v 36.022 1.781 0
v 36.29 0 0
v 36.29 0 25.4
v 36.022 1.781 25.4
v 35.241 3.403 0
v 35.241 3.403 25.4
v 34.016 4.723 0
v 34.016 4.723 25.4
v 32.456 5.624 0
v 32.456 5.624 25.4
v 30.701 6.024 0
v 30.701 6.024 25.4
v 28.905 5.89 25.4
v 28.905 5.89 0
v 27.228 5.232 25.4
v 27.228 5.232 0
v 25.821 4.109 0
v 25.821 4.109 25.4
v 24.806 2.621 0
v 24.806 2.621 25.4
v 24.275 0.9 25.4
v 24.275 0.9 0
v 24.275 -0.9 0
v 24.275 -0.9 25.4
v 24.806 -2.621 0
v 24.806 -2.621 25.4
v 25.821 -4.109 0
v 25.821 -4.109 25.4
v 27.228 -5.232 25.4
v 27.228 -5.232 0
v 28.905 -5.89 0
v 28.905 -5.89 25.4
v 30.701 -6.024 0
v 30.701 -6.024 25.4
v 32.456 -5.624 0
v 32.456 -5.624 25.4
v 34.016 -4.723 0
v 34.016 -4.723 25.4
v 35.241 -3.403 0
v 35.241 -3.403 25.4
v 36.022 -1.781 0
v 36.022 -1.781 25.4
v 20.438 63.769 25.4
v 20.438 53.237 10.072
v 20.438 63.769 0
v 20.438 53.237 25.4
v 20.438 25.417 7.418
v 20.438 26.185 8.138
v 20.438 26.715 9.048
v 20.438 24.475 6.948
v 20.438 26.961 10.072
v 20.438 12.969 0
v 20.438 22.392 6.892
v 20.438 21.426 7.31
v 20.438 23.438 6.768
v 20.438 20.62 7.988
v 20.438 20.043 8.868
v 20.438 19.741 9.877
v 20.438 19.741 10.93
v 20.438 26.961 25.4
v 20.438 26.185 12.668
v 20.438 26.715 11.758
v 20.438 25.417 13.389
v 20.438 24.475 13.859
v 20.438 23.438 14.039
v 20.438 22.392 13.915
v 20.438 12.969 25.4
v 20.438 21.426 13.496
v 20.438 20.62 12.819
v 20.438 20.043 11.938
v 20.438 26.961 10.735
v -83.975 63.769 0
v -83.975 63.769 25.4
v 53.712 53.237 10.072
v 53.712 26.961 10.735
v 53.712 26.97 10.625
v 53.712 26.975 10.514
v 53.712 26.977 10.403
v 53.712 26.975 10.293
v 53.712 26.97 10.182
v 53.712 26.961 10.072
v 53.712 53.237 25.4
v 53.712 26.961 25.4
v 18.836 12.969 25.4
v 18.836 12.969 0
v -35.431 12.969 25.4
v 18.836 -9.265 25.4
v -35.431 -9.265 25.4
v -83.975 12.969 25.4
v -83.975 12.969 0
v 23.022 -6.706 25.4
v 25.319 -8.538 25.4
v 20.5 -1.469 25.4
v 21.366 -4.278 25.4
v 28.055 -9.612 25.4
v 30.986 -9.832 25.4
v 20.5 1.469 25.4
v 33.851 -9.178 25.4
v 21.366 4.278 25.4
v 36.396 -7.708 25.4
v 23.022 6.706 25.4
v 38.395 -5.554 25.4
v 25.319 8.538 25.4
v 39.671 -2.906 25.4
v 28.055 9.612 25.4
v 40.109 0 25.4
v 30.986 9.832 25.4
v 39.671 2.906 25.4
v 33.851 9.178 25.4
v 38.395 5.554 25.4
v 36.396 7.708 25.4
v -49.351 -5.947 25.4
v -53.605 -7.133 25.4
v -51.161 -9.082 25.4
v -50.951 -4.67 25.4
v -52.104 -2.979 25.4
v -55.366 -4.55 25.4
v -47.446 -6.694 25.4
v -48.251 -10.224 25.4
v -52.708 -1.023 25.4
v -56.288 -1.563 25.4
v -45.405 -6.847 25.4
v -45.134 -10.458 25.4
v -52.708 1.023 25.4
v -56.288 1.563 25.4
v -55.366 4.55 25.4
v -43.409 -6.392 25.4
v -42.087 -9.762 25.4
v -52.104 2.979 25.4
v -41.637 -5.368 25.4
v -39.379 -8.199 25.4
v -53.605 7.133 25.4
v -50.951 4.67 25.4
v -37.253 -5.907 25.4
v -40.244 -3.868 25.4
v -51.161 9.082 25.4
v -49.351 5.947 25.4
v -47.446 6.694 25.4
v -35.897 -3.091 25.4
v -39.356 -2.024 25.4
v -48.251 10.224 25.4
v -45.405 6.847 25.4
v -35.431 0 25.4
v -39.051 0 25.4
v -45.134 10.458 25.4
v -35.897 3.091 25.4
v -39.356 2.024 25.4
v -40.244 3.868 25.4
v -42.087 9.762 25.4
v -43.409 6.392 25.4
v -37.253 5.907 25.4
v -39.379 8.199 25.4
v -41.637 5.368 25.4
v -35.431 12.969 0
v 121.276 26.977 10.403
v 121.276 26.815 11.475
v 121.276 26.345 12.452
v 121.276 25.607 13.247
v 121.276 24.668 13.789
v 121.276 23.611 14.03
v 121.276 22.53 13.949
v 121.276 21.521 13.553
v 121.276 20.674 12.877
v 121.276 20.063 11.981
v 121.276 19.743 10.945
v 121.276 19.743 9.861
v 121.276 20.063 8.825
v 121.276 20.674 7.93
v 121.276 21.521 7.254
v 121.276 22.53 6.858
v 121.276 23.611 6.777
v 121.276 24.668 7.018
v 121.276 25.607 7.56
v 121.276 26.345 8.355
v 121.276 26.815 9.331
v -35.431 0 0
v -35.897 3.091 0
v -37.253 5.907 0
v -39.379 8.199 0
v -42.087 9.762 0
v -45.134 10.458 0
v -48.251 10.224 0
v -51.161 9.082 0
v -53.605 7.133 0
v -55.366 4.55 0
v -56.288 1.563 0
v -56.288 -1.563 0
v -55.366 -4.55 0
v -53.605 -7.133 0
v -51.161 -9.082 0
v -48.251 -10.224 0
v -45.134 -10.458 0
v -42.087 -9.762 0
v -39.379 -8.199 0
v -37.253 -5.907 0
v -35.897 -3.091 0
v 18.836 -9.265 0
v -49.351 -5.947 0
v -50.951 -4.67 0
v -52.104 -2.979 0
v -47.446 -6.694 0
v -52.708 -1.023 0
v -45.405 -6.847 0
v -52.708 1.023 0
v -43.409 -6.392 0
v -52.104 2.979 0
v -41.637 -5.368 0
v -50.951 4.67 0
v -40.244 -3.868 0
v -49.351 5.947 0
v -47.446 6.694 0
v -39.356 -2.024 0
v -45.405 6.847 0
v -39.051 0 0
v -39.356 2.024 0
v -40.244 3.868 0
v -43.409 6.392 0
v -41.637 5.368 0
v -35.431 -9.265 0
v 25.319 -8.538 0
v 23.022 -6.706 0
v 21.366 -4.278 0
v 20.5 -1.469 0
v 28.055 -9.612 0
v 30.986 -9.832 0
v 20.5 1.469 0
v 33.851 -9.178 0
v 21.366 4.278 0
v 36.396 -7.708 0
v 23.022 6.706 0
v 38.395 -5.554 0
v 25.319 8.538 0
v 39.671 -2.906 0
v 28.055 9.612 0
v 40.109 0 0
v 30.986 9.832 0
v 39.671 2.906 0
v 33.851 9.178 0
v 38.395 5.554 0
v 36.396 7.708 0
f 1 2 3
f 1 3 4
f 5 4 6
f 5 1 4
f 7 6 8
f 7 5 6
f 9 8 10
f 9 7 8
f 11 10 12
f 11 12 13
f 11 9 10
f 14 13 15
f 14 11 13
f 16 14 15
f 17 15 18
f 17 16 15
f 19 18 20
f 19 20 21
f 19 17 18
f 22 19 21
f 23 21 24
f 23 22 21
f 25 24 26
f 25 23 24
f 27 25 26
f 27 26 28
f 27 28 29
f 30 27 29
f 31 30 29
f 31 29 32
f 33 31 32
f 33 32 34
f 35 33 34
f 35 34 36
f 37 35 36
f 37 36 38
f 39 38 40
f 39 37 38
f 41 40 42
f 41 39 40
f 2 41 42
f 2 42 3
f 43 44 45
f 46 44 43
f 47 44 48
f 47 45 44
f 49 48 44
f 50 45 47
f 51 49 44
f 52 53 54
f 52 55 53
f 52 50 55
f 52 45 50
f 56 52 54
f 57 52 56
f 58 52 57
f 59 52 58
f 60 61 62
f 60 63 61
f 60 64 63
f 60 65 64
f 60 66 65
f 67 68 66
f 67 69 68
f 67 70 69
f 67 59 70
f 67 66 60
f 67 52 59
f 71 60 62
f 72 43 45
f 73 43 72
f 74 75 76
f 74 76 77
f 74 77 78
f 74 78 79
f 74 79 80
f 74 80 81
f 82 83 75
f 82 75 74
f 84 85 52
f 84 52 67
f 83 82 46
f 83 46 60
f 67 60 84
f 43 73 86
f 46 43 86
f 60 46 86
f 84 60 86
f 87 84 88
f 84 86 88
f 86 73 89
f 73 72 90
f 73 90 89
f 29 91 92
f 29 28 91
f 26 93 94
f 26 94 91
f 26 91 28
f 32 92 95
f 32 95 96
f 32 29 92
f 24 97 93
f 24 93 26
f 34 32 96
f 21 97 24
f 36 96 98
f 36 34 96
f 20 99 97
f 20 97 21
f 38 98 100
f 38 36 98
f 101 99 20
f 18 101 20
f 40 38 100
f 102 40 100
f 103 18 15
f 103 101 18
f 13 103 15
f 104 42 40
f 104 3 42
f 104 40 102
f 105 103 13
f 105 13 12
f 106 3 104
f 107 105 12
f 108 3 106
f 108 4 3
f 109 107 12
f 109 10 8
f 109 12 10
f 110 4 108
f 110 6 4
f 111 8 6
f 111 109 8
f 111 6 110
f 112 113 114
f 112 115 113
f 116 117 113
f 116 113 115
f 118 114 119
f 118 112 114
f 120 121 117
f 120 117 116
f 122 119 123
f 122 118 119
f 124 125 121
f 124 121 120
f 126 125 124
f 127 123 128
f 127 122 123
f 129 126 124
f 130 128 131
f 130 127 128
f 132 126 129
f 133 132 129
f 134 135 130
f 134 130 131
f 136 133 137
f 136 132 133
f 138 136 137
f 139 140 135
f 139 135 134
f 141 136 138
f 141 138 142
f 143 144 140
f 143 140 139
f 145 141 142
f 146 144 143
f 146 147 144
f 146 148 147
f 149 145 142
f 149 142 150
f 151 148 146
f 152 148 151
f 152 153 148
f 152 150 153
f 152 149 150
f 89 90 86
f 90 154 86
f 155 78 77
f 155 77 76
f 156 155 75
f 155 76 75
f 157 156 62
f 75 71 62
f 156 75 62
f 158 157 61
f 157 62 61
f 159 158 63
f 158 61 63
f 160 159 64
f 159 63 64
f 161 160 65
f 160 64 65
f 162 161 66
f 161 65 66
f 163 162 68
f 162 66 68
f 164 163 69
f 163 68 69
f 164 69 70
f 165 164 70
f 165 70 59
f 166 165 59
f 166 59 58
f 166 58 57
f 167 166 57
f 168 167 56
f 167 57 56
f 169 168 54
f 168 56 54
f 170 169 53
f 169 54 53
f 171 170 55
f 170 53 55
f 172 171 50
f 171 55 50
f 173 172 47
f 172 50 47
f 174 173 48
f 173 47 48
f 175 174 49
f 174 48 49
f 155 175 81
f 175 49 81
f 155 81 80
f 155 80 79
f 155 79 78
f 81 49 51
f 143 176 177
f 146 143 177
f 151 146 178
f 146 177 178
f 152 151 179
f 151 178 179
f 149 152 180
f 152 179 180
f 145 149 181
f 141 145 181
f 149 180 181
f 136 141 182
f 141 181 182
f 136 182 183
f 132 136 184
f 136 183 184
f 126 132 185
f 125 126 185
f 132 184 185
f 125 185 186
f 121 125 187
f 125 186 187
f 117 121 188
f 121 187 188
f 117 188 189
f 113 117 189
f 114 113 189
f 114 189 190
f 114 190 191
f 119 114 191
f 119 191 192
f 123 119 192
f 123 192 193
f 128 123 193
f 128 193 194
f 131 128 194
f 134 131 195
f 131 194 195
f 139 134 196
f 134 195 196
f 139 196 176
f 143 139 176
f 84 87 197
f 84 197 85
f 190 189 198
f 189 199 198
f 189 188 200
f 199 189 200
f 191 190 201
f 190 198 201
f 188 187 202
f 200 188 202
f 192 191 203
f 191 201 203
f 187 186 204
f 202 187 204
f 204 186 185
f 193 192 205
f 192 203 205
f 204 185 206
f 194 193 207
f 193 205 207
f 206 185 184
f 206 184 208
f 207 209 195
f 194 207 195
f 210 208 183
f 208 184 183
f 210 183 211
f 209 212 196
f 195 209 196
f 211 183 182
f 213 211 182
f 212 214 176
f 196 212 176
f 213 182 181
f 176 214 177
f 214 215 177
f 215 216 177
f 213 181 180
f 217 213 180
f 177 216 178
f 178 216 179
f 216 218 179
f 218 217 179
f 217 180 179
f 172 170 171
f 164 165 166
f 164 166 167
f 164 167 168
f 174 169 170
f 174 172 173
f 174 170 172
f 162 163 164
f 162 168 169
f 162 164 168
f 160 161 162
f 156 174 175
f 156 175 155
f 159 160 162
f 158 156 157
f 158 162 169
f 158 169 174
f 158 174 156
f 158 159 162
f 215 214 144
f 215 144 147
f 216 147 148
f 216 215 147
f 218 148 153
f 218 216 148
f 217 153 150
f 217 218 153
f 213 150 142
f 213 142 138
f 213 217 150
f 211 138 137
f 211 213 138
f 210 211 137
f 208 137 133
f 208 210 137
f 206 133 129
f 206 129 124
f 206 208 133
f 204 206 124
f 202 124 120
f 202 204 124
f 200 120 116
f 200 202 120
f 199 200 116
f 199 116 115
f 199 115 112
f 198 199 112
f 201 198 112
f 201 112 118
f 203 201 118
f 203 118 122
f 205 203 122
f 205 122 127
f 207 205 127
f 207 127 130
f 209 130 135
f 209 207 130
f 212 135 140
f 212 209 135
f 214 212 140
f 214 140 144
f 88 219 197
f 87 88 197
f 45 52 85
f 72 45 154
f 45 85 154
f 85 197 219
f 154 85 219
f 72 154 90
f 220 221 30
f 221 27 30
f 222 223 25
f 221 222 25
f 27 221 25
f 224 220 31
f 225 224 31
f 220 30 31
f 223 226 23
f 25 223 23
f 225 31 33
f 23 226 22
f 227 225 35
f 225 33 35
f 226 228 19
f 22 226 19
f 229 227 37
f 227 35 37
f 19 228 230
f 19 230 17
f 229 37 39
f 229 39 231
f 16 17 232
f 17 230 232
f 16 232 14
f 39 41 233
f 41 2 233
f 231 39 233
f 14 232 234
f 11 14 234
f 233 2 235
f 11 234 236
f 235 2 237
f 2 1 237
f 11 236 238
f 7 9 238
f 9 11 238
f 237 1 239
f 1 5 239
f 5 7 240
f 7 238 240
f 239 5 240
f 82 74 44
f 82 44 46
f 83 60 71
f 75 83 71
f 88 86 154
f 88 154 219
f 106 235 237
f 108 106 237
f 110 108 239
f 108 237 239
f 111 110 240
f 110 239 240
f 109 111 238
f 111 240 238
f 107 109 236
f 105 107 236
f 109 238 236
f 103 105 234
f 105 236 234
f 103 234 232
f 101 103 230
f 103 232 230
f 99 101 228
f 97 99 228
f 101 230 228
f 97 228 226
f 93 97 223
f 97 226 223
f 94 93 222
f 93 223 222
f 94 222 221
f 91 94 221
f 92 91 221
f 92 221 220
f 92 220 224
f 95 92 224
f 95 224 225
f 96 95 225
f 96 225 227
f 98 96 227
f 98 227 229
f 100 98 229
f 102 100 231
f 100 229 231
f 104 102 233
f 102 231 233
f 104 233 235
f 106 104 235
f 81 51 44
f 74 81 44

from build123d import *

# Parameters (mm, degrees)
F1_DEPTH  = 25.4
F0_R      = 9.8593951513
F0_R_2    = 6.0413144076
F0_R_3    = 10.4869008064
F0_R_4    = 6.8665215602
F2_W      = 28.213518206
F2_H      = 25.4
F3_DEPTH  = 25.4
F4_DEPTH  = 25.4
F5_R      = 3.6369232823
F6_DEPTH  = 100.838
F7_W      = 25.4
F7_H      = 25.4
F8_DEPTH  = 25.4
F9_DEPTH  = 25.4
F10_W     = 104.413518206
F10_H     = 25.4
F11_DEPTH = 25.4
F13_DEPTH = 33.274


with BuildPart() as f1:
    # F0 (on Top) → F1 (new body)
    with BuildSketch(Plane.XY):
        Polygon((18.8361201435, 12.9692303017), (-35.4309603572, 12.9692303017), (-35.4309603572, 0), (-35.4309603572, -9.264969267), (18.8361201435, -9.264969267), align=None)
    extrude(amount=F1_DEPTH)

    # F2 (on face) → F3 (join)
    with BuildSketch(Plane(origin=(0, 12.9692303017, 0), x_dir=(-1, 0, 0), z_dir=(0, 1, 0))):
        with Locations((19.0684709232, 12.7)):
            Rectangle(F2_W, F2_H)
    extrude(amount=F3_DEPTH)

    # F4 (add): a face of the model
    f4_faces = [f1.faces().sort_by_distance(p)[0] for p in [
        (-4.9617118202, 25.6692303017, 12.7),
    ]]
    extrude(f4_faces, amount=F4_DEPTH)

    # F5 (on face) → F6 (join)
    with BuildSketch(Plane.YZ.offset(20.4382881798)):
        with Locations((23.3396794647, 10.4033220559)):
            Circle(F5_R)
    extrude(amount=F6_DEPTH)

    # F7 (on face) → F8 (join)
    with BuildSketch(Plane(origin=(-33.1752300262, 0, 0), x_dir=(0, -1, 0), z_dir=(-1, 0, 0))):
        with Locations((-25.6692303017, 12.7)):
            Rectangle(F7_W, F7_H)
    extrude(amount=F8_DEPTH)

    # F9 (add): a face of the model
    f9_faces = [f1.faces().sort_by_distance(p)[0] for p in [
        (-58.5752300262, 25.6692303017, 12.7),
    ]]
    extrude(f9_faces, amount=F9_DEPTH)

    # F10 (on face) → F11 (join)
    with BuildSketch(Plane(origin=(0, 38.3692303017, 0), x_dir=(-1, 0, 0), z_dir=(0, 1, 0))):
        with Locations((31.7684709232, 12.7)):
            Rectangle(F10_W, F10_H)
    extrude(amount=F11_DEPTH)

    # F12 (on face) → F13 (join)
    with BuildSketch(Plane.YZ.offset(20.4382881798)):
        with BuildLine():
            Line((53.2369054854, 10.0716692831), (53.2369054854, 25.4))
            Line((53.2369054854, 25.4), (26.9614493911, 25.4))
            Line((26.9614493911, 25.4), (26.9614493911, 10.7349748288))
            ThreePointArc((26.9614493911, 10.7349748288), (26.972812433, 10.5693214429), (26.976602747, 10.4033220559))
            ThreePointArc((26.976602747, 10.4033220559), (26.972812433, 10.2373226689), (26.9614493911, 10.0716692831))
            Line((26.9614493911, 10.0716692831), (53.2369054854, 10.0716692831))
        make_face()
    extrude(amount=F13_DEPTH)


with BuildPart() as f1b:
    # F0 (on Top) → F1, piece 2 (new body)
    with BuildSketch(Plane.XY):
        with Locations((30.249144882, 0)):
            Circle(F0_R)
        with Locations((30.249144882, 0)):
            Circle(F0_R_2, mode=Mode.SUBTRACT)
    extrude(amount=F1_DEPTH)


with BuildPart() as f1c:
    # F0 (on Top) → F1, piece 3 (new body)
    with BuildSketch(Plane.XY):
        with Locations((-45.9178611636, 0)):
            Circle(F0_R_3)
        with Locations((-45.9178611636, 0)):
            Circle(F0_R_4, mode=Mode.SUBTRACT)
    extrude(amount=F1_DEPTH)


solid = Compound([f1.part, f1b.part, f1c.part])
